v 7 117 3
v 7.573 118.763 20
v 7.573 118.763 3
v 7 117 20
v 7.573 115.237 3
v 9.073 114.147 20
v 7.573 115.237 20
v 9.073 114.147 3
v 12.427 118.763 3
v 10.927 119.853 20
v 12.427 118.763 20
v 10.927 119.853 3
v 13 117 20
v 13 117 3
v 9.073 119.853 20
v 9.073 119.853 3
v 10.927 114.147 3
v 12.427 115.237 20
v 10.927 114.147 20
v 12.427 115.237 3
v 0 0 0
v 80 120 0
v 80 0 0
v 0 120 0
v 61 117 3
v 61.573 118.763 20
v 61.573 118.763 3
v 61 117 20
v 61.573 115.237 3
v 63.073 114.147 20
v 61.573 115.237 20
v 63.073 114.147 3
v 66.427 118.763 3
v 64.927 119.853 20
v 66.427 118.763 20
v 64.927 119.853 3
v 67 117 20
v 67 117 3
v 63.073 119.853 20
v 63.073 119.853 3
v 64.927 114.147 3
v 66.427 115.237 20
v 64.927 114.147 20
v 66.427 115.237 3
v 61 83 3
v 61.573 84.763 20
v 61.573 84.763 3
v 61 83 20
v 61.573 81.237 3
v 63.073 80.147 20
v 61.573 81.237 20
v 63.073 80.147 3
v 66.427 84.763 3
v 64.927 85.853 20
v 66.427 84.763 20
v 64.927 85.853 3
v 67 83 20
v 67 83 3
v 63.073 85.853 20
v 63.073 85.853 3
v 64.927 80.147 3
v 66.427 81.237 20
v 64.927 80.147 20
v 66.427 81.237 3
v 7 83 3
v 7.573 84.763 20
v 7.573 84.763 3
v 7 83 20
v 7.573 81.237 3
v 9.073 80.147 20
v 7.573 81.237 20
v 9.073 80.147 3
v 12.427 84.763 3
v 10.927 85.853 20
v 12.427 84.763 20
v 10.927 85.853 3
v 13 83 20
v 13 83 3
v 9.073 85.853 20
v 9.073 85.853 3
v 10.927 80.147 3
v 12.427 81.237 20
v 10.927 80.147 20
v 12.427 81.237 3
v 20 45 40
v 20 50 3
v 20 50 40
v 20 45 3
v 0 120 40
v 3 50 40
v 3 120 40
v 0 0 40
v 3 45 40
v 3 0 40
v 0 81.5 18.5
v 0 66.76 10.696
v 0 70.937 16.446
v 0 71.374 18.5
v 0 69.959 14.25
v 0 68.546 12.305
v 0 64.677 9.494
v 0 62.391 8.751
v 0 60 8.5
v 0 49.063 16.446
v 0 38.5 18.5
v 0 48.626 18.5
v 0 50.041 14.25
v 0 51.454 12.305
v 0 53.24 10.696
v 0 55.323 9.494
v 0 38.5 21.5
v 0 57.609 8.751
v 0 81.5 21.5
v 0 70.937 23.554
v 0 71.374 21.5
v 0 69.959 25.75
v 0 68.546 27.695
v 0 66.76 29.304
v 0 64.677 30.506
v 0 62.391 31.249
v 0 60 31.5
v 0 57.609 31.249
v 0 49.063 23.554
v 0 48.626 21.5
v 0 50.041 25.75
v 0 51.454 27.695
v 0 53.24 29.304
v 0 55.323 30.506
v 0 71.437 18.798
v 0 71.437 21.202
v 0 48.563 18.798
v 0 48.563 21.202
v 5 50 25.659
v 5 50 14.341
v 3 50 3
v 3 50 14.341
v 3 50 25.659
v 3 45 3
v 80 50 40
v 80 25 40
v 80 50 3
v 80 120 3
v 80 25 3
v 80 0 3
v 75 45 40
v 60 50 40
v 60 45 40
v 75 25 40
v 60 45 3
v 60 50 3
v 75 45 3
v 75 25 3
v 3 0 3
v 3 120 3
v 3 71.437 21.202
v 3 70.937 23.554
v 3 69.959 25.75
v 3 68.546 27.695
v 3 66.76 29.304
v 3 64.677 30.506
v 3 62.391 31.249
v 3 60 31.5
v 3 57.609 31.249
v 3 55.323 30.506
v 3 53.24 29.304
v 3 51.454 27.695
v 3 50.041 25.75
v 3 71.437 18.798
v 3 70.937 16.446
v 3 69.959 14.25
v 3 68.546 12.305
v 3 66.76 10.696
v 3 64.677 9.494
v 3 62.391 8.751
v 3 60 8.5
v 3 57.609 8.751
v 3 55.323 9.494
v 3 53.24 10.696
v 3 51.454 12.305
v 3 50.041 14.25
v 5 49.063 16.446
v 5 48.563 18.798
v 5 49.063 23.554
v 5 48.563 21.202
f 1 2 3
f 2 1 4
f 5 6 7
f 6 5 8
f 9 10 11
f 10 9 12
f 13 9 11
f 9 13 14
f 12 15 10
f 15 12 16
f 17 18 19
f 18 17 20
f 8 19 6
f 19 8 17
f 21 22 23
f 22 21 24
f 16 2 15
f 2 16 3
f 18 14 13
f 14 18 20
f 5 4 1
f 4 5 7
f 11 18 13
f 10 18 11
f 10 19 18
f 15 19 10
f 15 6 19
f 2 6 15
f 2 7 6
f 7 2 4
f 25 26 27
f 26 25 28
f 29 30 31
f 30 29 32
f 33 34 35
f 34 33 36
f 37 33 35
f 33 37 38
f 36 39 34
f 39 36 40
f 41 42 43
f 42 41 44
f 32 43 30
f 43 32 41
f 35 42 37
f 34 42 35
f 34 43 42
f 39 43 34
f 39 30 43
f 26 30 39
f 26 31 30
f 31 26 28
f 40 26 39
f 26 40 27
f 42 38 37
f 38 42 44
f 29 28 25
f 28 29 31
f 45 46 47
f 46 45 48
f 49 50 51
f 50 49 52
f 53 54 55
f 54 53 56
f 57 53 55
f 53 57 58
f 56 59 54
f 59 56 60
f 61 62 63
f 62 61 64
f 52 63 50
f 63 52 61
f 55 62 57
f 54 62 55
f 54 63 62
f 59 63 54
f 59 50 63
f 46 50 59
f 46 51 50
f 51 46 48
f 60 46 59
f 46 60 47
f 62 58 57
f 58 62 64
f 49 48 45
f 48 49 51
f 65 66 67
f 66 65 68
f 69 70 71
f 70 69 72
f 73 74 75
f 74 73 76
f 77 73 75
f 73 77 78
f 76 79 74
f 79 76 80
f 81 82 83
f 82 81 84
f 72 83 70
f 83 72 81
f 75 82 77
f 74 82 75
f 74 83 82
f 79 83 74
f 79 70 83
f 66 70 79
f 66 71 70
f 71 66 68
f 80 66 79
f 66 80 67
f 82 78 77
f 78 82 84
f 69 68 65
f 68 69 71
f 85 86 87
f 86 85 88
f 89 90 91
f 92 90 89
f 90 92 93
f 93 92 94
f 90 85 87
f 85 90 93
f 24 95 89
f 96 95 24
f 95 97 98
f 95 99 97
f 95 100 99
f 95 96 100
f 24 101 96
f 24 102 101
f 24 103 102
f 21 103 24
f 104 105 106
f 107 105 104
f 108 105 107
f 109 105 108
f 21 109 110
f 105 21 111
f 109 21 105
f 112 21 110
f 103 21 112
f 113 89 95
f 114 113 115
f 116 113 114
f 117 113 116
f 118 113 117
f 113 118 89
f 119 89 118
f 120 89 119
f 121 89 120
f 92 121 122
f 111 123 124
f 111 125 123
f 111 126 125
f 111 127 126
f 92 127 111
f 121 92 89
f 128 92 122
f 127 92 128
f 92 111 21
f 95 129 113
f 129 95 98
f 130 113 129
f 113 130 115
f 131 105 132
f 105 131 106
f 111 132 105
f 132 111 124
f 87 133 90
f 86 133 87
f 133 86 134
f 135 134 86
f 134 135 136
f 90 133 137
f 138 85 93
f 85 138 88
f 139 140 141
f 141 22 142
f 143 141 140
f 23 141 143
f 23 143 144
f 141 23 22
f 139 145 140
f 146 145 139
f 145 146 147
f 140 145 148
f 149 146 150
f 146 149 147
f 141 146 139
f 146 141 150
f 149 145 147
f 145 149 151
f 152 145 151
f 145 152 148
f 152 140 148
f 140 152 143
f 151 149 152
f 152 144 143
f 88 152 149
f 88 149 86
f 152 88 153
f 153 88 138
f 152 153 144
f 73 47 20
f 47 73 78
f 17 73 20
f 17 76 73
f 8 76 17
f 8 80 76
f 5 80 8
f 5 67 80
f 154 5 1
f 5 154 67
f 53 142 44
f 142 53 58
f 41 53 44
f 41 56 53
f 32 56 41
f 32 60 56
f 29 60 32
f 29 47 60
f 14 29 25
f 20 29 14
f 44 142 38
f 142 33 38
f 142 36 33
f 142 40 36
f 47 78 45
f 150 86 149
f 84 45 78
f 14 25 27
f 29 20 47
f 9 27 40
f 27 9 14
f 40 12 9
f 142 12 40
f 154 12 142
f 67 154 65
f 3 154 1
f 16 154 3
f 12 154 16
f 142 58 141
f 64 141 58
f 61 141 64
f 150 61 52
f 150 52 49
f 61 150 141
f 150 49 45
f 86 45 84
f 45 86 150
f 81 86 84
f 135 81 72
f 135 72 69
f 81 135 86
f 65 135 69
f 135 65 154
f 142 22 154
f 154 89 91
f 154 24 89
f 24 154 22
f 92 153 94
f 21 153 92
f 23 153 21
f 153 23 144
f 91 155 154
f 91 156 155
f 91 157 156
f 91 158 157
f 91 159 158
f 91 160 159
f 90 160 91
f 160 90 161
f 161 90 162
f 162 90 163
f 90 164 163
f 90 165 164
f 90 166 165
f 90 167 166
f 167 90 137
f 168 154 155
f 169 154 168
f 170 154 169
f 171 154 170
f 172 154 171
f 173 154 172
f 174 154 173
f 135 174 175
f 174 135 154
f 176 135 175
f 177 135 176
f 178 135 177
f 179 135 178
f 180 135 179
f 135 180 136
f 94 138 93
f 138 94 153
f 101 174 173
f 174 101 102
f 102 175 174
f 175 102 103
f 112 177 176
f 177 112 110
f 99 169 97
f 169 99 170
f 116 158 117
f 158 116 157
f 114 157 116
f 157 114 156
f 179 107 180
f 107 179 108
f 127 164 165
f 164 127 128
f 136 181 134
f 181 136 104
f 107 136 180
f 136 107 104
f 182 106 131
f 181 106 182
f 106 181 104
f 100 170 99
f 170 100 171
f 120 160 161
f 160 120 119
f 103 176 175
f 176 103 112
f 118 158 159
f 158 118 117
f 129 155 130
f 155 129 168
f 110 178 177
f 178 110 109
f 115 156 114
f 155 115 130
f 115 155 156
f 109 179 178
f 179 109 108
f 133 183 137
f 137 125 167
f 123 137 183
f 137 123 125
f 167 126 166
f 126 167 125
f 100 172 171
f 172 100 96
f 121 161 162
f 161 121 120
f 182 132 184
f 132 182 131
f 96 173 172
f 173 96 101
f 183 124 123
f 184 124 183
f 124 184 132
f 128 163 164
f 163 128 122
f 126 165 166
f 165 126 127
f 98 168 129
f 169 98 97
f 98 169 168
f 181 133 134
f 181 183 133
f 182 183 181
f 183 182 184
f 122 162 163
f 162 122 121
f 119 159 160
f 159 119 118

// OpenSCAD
$width = 120;
$length = 80;
$wall = 3;
$height = 40;

$pegDiameter = 6;

$boardWidth = 34;
$boardLength = 54;

$pvc_od = 23;
$openingLength = 10;
$lip = 20;

all();

module all()
{
    difference()
    {
        union()
        {
            cube([$length, $width, $wall]);
            cube([$wall, $width, $height]);

            pegs();
            servo();

            //color("red")
            //opening();
        }
        
        openinghole();
    }
}

module pegs()
{
    translate([10, $width-$pegDiameter/2, 0])
        cylinder($height/2, d = $pegDiameter);
    
    translate([10+$boardLength, $width-$pegDiameter/2, 0])
        cylinder($height/2, d = $pegDiameter);
    
    translate([10+$boardLength, $width-$pegDiameter/2 - $boardWidth, 0])
        cylinder($height/2, d = $pegDiameter);
    
    translate([10, $width-$pegDiameter/2 - $boardWidth, 0])
        cylinder($height/2, d = $pegDiameter);
}

module servo()
{
    translate([0, $width/2 - 15, 0])
    cube([20, 5, $height]);
    
    translate([20 + 40, $width/2 - 15, 0])
    cube([20, 5, $height]);
    
    translate([20 + 40 + 20 - 5, $width/2 - 15 - 20, 0])
    cube([5, 20, $height]);
}

module opening()
{    
    translate([-$openingLength, $width/2, $height/2])
    rotate([0,90, 0])
    {
        cylinder($openingLength, d = $pvc_od + 5);
        
        translate([-5, -($pvc_od + $lip)/2, 0])
        cube([10, $pvc_od + $lip, 9]);
    }
    
    
}

module openinghole()
{
    translate([-$openingLength, $width/2, $height/2])
    rotate([0,90, 0])
    {
        cylinder($openingLength + $wall + 2, d = $pvc_od);
        
        translate([-3/2, -($pvc_od + $lip)/2, 0])
        cube([3, $pvc_od + $lip, 10]);
    }
}
